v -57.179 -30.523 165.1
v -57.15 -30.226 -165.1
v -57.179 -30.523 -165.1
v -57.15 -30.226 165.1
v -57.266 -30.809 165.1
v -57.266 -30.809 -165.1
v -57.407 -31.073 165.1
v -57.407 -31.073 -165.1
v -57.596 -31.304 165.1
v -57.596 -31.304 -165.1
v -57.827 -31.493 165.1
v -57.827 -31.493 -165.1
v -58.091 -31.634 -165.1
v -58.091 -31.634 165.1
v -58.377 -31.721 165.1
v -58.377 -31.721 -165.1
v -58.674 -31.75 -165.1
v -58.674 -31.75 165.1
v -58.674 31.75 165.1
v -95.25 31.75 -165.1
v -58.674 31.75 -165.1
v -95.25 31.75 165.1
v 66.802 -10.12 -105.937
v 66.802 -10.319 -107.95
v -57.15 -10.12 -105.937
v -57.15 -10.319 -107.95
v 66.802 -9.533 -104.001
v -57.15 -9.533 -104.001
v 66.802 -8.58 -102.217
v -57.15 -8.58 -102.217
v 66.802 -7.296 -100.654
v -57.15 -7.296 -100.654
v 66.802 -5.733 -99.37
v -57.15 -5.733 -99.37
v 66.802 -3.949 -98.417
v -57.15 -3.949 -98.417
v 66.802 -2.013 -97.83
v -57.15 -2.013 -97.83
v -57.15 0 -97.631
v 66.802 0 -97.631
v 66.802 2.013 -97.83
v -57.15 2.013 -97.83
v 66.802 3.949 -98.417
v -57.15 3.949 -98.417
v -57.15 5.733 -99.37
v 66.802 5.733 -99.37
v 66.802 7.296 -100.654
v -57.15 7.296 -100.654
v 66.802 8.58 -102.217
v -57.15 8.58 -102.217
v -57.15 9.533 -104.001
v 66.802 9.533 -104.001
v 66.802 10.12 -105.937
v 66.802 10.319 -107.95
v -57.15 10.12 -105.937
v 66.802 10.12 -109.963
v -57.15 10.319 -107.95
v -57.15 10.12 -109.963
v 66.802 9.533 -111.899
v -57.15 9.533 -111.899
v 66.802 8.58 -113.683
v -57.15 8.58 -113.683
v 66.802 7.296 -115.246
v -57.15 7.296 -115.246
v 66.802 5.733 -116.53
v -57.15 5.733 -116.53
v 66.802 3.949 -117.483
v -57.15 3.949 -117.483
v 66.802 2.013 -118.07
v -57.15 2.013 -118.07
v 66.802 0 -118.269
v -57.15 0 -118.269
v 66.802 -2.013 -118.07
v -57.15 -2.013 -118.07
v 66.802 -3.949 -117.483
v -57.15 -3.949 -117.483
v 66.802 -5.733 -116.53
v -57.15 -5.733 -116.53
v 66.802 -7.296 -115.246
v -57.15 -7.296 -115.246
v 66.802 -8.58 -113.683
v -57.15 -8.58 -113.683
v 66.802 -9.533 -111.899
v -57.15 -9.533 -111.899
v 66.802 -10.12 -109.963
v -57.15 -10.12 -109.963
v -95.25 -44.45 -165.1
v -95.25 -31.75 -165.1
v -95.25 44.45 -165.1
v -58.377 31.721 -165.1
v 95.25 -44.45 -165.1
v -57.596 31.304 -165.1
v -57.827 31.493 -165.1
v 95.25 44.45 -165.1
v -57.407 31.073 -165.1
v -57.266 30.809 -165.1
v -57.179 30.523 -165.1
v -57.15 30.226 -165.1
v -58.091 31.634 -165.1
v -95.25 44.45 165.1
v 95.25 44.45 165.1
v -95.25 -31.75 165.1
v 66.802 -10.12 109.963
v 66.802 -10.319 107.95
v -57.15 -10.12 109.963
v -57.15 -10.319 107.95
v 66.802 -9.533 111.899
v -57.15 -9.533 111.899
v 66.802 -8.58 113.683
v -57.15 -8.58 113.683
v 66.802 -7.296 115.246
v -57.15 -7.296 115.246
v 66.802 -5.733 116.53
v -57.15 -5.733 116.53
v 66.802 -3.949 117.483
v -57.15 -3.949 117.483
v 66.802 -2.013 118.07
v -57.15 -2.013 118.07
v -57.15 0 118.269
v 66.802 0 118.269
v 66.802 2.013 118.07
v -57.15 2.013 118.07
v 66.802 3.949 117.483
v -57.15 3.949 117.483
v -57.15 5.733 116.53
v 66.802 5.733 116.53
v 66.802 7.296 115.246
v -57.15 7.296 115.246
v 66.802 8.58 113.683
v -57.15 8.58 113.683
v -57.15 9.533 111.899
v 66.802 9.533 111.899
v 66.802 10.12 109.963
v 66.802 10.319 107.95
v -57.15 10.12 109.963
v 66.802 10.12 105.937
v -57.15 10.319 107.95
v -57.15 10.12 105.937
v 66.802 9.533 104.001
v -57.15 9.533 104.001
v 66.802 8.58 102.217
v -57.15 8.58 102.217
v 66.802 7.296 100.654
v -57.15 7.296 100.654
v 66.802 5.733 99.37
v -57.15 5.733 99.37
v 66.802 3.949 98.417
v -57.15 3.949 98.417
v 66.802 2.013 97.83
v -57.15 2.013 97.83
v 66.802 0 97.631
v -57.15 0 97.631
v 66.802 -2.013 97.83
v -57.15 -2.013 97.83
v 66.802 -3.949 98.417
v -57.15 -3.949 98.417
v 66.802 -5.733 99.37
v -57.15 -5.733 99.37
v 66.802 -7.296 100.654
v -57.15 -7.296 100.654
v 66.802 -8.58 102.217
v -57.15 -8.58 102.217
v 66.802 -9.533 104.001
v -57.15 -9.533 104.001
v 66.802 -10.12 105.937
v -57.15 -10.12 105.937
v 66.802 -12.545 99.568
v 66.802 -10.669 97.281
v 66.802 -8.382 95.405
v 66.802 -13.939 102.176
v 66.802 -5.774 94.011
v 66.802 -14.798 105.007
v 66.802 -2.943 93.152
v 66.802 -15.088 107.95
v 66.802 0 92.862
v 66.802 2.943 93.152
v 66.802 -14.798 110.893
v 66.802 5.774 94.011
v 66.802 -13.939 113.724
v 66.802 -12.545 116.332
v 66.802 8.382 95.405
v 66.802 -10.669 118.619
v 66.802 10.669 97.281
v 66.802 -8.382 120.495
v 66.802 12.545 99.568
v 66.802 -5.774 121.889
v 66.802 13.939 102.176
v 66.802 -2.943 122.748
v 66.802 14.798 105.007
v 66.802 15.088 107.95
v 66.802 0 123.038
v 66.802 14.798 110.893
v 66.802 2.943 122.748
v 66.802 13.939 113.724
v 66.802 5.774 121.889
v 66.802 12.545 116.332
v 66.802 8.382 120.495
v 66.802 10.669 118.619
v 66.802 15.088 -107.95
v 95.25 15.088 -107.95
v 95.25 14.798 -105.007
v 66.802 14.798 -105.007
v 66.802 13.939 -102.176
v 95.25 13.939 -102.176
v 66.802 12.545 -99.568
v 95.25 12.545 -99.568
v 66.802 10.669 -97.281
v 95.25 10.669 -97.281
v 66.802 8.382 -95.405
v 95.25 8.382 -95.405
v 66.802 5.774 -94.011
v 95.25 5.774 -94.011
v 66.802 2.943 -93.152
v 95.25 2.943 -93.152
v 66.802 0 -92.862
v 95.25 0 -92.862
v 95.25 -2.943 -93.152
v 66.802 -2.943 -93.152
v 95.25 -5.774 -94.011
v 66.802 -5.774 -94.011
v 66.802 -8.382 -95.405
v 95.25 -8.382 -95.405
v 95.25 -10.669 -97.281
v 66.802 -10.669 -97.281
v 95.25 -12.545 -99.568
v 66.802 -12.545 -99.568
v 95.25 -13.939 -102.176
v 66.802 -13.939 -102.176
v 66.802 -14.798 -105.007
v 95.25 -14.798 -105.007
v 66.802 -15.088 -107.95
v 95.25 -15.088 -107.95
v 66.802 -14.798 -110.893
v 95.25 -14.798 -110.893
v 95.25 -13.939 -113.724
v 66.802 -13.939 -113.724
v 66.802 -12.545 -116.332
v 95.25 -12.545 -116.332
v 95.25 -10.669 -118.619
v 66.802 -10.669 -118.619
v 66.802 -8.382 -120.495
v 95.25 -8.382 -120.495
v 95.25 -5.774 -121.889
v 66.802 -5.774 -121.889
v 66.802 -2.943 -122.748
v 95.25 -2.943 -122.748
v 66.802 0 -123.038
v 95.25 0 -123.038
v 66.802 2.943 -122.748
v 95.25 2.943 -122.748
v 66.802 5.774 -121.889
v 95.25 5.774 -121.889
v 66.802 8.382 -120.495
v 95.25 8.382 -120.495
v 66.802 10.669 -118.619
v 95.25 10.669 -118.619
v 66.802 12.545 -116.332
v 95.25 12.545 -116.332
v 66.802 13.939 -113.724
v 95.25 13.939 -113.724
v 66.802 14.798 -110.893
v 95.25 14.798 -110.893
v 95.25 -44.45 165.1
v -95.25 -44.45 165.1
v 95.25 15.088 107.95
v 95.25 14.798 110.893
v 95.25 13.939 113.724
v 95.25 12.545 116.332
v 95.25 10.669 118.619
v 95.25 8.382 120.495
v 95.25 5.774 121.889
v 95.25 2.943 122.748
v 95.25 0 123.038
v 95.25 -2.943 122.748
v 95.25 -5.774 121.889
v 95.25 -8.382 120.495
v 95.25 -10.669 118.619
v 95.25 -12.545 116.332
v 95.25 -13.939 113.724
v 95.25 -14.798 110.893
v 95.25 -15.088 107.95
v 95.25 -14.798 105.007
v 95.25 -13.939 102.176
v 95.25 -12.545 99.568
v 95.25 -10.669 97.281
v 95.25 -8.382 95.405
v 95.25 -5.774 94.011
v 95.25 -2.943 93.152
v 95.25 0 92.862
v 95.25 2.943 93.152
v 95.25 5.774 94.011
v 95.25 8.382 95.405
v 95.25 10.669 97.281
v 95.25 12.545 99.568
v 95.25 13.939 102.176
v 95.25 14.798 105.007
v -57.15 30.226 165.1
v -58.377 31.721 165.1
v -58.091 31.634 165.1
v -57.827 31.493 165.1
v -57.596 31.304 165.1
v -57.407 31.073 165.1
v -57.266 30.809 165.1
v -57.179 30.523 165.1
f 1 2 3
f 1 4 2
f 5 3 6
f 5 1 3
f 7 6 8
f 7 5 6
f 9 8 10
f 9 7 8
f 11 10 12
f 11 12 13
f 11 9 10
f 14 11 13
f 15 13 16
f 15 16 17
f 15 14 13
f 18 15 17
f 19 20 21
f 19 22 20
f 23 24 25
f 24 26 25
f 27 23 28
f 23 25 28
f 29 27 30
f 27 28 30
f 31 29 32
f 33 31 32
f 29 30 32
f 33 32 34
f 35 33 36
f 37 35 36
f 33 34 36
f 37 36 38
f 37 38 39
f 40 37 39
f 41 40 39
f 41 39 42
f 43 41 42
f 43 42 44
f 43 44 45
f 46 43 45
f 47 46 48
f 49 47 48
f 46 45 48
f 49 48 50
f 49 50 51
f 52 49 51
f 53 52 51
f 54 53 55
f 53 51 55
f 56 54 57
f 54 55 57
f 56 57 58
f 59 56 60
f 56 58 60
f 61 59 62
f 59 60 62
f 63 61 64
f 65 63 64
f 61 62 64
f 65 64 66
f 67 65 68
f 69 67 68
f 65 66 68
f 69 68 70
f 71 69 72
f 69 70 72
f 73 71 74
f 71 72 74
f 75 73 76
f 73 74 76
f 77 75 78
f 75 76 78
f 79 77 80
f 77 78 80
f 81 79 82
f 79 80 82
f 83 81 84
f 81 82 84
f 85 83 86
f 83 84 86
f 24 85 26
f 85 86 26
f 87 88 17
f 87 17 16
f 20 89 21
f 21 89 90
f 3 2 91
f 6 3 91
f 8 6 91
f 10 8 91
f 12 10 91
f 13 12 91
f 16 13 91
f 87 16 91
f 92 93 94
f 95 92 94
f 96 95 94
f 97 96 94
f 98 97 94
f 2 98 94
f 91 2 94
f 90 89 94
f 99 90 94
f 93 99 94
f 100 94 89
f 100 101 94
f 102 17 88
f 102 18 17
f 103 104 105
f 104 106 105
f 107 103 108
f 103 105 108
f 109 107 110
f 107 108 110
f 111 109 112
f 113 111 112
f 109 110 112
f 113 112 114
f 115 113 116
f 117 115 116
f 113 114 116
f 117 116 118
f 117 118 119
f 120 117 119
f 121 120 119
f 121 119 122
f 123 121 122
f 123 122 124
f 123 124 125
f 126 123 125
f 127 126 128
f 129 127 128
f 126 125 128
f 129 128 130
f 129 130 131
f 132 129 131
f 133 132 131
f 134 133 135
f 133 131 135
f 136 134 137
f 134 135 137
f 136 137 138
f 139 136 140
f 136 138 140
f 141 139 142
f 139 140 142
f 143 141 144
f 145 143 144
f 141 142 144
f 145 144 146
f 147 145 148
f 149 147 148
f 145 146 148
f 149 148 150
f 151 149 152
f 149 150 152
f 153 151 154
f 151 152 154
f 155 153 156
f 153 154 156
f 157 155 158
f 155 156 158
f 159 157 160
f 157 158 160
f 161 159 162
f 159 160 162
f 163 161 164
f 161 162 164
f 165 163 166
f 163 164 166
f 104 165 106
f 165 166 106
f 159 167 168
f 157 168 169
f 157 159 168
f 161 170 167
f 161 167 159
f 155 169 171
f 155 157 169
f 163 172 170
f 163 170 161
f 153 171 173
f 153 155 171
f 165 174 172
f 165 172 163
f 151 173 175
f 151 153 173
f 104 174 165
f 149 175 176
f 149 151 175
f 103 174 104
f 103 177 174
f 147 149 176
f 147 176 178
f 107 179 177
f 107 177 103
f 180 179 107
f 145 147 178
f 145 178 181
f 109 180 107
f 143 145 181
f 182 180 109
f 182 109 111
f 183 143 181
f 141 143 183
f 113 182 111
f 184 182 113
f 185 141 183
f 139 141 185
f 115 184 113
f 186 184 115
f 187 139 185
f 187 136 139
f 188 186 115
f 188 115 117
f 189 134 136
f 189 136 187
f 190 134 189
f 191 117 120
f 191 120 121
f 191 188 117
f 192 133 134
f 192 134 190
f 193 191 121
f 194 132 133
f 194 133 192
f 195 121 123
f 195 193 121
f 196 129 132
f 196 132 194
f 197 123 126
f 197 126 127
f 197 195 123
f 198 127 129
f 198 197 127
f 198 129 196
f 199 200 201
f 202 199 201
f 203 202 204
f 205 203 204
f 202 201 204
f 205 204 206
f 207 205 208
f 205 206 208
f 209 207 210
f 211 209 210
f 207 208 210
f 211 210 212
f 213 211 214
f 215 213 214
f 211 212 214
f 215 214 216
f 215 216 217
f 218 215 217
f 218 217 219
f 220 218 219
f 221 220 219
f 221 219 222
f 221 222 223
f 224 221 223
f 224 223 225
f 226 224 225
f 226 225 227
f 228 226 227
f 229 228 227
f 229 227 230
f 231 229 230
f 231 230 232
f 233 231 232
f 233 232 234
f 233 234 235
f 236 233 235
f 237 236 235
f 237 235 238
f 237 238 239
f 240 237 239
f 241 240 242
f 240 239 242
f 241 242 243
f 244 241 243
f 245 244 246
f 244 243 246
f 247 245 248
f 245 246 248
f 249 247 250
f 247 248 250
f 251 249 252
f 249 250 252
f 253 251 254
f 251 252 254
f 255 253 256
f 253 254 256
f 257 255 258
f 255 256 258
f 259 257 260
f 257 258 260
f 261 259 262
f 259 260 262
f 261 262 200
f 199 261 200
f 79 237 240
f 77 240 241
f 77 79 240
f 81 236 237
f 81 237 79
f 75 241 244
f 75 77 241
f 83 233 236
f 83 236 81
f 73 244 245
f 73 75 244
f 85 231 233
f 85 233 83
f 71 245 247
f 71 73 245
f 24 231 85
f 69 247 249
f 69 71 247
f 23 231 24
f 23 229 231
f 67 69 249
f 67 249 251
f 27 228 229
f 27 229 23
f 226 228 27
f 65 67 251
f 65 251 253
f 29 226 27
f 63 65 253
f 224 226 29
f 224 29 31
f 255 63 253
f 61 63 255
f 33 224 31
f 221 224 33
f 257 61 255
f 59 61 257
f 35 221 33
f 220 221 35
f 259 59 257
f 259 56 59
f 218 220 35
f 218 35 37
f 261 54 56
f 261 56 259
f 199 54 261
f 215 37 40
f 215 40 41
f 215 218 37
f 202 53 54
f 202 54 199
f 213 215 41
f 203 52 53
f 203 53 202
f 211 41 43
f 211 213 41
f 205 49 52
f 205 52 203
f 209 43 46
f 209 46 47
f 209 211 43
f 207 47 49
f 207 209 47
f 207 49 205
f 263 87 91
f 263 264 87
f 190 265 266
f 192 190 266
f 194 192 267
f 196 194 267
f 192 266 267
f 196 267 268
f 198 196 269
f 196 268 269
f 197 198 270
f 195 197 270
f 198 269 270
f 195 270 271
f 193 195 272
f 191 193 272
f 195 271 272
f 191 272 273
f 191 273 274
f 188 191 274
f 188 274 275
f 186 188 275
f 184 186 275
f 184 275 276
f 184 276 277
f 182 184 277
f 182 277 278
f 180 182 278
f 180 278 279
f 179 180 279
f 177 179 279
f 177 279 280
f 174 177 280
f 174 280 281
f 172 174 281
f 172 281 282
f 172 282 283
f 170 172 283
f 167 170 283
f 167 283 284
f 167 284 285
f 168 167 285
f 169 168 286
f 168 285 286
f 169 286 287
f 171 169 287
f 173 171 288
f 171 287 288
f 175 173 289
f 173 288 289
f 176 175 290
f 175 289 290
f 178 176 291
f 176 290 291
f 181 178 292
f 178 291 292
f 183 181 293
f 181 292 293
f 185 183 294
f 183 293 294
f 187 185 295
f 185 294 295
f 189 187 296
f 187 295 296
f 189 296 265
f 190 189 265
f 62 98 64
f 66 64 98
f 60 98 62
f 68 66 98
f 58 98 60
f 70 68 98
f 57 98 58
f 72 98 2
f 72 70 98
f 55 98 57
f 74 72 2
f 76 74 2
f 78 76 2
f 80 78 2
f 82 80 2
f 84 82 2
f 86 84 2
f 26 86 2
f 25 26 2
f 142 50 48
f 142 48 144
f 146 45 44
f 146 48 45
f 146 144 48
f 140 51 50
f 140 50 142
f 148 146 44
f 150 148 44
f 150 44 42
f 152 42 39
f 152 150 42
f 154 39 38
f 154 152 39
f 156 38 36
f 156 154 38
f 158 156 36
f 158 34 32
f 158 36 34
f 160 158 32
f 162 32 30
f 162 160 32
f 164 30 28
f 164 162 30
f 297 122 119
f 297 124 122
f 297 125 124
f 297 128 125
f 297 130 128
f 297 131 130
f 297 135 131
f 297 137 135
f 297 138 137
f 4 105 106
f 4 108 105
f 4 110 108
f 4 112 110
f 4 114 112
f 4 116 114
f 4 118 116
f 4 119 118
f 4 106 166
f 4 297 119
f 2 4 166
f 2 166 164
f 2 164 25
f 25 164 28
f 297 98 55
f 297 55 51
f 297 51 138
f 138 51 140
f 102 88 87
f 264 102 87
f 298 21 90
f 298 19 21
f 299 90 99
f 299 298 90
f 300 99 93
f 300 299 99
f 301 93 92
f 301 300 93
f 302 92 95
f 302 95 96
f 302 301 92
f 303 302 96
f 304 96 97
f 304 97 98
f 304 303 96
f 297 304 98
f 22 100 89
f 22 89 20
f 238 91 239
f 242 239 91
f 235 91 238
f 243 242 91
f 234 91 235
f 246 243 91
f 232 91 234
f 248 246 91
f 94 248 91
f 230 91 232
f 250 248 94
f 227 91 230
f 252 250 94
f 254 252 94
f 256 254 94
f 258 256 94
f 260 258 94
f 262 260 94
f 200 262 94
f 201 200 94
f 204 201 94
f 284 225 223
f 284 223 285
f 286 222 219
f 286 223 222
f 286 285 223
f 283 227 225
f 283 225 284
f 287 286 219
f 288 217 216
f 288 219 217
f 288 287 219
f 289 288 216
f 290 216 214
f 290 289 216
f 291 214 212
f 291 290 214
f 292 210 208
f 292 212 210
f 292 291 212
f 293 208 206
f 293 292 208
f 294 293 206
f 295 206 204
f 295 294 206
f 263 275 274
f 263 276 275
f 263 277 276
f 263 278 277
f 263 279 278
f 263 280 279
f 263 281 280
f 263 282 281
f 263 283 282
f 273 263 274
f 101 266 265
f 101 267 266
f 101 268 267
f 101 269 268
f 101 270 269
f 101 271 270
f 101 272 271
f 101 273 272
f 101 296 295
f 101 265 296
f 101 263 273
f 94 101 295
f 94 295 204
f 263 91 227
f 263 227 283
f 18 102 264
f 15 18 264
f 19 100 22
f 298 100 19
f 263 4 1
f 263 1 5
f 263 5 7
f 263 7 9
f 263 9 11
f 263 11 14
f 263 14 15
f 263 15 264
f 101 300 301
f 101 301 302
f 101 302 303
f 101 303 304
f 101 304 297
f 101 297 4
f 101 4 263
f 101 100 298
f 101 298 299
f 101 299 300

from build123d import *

# Parameters (mm, degrees)
F1_DEPTH       = 165.1
F3_D           = 20.6375
F3_CBORE_D     = 30.1752
F3_CBORE_DEPTH = 28.448
F4_R           = 1.524


# Not quite as in the source:
# - a length typed as a fraction of an inch, garbled in the dataset ("3 / 203.2 mm" for 3/8 in), is restored


with BuildPart() as f1:
    # F0 (on Top) → F1 (new body, symmetric)
    with BuildSketch(Plane.XY):
        Polygon((95.25, 44.45), (-95.25, 44.45), (-95.25, 31.75), (-57.15, 31.75), (-57.15, -31.75), (-95.25, -31.75), (-95.25, -44.45), (95.25, -44.45), align=None)
    extrude(amount=F1_DEPTH, both=True)

    # F3 (through all)
    with Locations(Plane.YZ.offset(95.25)):
        with Locations((0, 107.95), (0, -107.95)):
            CounterBoreHole(F3_D / 2, F3_CBORE_D / 2, F3_CBORE_DEPTH)

    # F4
    f4_edges = [f1.edges().sort_by_distance(p)[0] for p in [
        (-57.15, 31.75, 0),
        (-57.15, -31.75, 0),
    ]]
    fillet(f4_edges, radius=F4_R)


solid = f1.part
